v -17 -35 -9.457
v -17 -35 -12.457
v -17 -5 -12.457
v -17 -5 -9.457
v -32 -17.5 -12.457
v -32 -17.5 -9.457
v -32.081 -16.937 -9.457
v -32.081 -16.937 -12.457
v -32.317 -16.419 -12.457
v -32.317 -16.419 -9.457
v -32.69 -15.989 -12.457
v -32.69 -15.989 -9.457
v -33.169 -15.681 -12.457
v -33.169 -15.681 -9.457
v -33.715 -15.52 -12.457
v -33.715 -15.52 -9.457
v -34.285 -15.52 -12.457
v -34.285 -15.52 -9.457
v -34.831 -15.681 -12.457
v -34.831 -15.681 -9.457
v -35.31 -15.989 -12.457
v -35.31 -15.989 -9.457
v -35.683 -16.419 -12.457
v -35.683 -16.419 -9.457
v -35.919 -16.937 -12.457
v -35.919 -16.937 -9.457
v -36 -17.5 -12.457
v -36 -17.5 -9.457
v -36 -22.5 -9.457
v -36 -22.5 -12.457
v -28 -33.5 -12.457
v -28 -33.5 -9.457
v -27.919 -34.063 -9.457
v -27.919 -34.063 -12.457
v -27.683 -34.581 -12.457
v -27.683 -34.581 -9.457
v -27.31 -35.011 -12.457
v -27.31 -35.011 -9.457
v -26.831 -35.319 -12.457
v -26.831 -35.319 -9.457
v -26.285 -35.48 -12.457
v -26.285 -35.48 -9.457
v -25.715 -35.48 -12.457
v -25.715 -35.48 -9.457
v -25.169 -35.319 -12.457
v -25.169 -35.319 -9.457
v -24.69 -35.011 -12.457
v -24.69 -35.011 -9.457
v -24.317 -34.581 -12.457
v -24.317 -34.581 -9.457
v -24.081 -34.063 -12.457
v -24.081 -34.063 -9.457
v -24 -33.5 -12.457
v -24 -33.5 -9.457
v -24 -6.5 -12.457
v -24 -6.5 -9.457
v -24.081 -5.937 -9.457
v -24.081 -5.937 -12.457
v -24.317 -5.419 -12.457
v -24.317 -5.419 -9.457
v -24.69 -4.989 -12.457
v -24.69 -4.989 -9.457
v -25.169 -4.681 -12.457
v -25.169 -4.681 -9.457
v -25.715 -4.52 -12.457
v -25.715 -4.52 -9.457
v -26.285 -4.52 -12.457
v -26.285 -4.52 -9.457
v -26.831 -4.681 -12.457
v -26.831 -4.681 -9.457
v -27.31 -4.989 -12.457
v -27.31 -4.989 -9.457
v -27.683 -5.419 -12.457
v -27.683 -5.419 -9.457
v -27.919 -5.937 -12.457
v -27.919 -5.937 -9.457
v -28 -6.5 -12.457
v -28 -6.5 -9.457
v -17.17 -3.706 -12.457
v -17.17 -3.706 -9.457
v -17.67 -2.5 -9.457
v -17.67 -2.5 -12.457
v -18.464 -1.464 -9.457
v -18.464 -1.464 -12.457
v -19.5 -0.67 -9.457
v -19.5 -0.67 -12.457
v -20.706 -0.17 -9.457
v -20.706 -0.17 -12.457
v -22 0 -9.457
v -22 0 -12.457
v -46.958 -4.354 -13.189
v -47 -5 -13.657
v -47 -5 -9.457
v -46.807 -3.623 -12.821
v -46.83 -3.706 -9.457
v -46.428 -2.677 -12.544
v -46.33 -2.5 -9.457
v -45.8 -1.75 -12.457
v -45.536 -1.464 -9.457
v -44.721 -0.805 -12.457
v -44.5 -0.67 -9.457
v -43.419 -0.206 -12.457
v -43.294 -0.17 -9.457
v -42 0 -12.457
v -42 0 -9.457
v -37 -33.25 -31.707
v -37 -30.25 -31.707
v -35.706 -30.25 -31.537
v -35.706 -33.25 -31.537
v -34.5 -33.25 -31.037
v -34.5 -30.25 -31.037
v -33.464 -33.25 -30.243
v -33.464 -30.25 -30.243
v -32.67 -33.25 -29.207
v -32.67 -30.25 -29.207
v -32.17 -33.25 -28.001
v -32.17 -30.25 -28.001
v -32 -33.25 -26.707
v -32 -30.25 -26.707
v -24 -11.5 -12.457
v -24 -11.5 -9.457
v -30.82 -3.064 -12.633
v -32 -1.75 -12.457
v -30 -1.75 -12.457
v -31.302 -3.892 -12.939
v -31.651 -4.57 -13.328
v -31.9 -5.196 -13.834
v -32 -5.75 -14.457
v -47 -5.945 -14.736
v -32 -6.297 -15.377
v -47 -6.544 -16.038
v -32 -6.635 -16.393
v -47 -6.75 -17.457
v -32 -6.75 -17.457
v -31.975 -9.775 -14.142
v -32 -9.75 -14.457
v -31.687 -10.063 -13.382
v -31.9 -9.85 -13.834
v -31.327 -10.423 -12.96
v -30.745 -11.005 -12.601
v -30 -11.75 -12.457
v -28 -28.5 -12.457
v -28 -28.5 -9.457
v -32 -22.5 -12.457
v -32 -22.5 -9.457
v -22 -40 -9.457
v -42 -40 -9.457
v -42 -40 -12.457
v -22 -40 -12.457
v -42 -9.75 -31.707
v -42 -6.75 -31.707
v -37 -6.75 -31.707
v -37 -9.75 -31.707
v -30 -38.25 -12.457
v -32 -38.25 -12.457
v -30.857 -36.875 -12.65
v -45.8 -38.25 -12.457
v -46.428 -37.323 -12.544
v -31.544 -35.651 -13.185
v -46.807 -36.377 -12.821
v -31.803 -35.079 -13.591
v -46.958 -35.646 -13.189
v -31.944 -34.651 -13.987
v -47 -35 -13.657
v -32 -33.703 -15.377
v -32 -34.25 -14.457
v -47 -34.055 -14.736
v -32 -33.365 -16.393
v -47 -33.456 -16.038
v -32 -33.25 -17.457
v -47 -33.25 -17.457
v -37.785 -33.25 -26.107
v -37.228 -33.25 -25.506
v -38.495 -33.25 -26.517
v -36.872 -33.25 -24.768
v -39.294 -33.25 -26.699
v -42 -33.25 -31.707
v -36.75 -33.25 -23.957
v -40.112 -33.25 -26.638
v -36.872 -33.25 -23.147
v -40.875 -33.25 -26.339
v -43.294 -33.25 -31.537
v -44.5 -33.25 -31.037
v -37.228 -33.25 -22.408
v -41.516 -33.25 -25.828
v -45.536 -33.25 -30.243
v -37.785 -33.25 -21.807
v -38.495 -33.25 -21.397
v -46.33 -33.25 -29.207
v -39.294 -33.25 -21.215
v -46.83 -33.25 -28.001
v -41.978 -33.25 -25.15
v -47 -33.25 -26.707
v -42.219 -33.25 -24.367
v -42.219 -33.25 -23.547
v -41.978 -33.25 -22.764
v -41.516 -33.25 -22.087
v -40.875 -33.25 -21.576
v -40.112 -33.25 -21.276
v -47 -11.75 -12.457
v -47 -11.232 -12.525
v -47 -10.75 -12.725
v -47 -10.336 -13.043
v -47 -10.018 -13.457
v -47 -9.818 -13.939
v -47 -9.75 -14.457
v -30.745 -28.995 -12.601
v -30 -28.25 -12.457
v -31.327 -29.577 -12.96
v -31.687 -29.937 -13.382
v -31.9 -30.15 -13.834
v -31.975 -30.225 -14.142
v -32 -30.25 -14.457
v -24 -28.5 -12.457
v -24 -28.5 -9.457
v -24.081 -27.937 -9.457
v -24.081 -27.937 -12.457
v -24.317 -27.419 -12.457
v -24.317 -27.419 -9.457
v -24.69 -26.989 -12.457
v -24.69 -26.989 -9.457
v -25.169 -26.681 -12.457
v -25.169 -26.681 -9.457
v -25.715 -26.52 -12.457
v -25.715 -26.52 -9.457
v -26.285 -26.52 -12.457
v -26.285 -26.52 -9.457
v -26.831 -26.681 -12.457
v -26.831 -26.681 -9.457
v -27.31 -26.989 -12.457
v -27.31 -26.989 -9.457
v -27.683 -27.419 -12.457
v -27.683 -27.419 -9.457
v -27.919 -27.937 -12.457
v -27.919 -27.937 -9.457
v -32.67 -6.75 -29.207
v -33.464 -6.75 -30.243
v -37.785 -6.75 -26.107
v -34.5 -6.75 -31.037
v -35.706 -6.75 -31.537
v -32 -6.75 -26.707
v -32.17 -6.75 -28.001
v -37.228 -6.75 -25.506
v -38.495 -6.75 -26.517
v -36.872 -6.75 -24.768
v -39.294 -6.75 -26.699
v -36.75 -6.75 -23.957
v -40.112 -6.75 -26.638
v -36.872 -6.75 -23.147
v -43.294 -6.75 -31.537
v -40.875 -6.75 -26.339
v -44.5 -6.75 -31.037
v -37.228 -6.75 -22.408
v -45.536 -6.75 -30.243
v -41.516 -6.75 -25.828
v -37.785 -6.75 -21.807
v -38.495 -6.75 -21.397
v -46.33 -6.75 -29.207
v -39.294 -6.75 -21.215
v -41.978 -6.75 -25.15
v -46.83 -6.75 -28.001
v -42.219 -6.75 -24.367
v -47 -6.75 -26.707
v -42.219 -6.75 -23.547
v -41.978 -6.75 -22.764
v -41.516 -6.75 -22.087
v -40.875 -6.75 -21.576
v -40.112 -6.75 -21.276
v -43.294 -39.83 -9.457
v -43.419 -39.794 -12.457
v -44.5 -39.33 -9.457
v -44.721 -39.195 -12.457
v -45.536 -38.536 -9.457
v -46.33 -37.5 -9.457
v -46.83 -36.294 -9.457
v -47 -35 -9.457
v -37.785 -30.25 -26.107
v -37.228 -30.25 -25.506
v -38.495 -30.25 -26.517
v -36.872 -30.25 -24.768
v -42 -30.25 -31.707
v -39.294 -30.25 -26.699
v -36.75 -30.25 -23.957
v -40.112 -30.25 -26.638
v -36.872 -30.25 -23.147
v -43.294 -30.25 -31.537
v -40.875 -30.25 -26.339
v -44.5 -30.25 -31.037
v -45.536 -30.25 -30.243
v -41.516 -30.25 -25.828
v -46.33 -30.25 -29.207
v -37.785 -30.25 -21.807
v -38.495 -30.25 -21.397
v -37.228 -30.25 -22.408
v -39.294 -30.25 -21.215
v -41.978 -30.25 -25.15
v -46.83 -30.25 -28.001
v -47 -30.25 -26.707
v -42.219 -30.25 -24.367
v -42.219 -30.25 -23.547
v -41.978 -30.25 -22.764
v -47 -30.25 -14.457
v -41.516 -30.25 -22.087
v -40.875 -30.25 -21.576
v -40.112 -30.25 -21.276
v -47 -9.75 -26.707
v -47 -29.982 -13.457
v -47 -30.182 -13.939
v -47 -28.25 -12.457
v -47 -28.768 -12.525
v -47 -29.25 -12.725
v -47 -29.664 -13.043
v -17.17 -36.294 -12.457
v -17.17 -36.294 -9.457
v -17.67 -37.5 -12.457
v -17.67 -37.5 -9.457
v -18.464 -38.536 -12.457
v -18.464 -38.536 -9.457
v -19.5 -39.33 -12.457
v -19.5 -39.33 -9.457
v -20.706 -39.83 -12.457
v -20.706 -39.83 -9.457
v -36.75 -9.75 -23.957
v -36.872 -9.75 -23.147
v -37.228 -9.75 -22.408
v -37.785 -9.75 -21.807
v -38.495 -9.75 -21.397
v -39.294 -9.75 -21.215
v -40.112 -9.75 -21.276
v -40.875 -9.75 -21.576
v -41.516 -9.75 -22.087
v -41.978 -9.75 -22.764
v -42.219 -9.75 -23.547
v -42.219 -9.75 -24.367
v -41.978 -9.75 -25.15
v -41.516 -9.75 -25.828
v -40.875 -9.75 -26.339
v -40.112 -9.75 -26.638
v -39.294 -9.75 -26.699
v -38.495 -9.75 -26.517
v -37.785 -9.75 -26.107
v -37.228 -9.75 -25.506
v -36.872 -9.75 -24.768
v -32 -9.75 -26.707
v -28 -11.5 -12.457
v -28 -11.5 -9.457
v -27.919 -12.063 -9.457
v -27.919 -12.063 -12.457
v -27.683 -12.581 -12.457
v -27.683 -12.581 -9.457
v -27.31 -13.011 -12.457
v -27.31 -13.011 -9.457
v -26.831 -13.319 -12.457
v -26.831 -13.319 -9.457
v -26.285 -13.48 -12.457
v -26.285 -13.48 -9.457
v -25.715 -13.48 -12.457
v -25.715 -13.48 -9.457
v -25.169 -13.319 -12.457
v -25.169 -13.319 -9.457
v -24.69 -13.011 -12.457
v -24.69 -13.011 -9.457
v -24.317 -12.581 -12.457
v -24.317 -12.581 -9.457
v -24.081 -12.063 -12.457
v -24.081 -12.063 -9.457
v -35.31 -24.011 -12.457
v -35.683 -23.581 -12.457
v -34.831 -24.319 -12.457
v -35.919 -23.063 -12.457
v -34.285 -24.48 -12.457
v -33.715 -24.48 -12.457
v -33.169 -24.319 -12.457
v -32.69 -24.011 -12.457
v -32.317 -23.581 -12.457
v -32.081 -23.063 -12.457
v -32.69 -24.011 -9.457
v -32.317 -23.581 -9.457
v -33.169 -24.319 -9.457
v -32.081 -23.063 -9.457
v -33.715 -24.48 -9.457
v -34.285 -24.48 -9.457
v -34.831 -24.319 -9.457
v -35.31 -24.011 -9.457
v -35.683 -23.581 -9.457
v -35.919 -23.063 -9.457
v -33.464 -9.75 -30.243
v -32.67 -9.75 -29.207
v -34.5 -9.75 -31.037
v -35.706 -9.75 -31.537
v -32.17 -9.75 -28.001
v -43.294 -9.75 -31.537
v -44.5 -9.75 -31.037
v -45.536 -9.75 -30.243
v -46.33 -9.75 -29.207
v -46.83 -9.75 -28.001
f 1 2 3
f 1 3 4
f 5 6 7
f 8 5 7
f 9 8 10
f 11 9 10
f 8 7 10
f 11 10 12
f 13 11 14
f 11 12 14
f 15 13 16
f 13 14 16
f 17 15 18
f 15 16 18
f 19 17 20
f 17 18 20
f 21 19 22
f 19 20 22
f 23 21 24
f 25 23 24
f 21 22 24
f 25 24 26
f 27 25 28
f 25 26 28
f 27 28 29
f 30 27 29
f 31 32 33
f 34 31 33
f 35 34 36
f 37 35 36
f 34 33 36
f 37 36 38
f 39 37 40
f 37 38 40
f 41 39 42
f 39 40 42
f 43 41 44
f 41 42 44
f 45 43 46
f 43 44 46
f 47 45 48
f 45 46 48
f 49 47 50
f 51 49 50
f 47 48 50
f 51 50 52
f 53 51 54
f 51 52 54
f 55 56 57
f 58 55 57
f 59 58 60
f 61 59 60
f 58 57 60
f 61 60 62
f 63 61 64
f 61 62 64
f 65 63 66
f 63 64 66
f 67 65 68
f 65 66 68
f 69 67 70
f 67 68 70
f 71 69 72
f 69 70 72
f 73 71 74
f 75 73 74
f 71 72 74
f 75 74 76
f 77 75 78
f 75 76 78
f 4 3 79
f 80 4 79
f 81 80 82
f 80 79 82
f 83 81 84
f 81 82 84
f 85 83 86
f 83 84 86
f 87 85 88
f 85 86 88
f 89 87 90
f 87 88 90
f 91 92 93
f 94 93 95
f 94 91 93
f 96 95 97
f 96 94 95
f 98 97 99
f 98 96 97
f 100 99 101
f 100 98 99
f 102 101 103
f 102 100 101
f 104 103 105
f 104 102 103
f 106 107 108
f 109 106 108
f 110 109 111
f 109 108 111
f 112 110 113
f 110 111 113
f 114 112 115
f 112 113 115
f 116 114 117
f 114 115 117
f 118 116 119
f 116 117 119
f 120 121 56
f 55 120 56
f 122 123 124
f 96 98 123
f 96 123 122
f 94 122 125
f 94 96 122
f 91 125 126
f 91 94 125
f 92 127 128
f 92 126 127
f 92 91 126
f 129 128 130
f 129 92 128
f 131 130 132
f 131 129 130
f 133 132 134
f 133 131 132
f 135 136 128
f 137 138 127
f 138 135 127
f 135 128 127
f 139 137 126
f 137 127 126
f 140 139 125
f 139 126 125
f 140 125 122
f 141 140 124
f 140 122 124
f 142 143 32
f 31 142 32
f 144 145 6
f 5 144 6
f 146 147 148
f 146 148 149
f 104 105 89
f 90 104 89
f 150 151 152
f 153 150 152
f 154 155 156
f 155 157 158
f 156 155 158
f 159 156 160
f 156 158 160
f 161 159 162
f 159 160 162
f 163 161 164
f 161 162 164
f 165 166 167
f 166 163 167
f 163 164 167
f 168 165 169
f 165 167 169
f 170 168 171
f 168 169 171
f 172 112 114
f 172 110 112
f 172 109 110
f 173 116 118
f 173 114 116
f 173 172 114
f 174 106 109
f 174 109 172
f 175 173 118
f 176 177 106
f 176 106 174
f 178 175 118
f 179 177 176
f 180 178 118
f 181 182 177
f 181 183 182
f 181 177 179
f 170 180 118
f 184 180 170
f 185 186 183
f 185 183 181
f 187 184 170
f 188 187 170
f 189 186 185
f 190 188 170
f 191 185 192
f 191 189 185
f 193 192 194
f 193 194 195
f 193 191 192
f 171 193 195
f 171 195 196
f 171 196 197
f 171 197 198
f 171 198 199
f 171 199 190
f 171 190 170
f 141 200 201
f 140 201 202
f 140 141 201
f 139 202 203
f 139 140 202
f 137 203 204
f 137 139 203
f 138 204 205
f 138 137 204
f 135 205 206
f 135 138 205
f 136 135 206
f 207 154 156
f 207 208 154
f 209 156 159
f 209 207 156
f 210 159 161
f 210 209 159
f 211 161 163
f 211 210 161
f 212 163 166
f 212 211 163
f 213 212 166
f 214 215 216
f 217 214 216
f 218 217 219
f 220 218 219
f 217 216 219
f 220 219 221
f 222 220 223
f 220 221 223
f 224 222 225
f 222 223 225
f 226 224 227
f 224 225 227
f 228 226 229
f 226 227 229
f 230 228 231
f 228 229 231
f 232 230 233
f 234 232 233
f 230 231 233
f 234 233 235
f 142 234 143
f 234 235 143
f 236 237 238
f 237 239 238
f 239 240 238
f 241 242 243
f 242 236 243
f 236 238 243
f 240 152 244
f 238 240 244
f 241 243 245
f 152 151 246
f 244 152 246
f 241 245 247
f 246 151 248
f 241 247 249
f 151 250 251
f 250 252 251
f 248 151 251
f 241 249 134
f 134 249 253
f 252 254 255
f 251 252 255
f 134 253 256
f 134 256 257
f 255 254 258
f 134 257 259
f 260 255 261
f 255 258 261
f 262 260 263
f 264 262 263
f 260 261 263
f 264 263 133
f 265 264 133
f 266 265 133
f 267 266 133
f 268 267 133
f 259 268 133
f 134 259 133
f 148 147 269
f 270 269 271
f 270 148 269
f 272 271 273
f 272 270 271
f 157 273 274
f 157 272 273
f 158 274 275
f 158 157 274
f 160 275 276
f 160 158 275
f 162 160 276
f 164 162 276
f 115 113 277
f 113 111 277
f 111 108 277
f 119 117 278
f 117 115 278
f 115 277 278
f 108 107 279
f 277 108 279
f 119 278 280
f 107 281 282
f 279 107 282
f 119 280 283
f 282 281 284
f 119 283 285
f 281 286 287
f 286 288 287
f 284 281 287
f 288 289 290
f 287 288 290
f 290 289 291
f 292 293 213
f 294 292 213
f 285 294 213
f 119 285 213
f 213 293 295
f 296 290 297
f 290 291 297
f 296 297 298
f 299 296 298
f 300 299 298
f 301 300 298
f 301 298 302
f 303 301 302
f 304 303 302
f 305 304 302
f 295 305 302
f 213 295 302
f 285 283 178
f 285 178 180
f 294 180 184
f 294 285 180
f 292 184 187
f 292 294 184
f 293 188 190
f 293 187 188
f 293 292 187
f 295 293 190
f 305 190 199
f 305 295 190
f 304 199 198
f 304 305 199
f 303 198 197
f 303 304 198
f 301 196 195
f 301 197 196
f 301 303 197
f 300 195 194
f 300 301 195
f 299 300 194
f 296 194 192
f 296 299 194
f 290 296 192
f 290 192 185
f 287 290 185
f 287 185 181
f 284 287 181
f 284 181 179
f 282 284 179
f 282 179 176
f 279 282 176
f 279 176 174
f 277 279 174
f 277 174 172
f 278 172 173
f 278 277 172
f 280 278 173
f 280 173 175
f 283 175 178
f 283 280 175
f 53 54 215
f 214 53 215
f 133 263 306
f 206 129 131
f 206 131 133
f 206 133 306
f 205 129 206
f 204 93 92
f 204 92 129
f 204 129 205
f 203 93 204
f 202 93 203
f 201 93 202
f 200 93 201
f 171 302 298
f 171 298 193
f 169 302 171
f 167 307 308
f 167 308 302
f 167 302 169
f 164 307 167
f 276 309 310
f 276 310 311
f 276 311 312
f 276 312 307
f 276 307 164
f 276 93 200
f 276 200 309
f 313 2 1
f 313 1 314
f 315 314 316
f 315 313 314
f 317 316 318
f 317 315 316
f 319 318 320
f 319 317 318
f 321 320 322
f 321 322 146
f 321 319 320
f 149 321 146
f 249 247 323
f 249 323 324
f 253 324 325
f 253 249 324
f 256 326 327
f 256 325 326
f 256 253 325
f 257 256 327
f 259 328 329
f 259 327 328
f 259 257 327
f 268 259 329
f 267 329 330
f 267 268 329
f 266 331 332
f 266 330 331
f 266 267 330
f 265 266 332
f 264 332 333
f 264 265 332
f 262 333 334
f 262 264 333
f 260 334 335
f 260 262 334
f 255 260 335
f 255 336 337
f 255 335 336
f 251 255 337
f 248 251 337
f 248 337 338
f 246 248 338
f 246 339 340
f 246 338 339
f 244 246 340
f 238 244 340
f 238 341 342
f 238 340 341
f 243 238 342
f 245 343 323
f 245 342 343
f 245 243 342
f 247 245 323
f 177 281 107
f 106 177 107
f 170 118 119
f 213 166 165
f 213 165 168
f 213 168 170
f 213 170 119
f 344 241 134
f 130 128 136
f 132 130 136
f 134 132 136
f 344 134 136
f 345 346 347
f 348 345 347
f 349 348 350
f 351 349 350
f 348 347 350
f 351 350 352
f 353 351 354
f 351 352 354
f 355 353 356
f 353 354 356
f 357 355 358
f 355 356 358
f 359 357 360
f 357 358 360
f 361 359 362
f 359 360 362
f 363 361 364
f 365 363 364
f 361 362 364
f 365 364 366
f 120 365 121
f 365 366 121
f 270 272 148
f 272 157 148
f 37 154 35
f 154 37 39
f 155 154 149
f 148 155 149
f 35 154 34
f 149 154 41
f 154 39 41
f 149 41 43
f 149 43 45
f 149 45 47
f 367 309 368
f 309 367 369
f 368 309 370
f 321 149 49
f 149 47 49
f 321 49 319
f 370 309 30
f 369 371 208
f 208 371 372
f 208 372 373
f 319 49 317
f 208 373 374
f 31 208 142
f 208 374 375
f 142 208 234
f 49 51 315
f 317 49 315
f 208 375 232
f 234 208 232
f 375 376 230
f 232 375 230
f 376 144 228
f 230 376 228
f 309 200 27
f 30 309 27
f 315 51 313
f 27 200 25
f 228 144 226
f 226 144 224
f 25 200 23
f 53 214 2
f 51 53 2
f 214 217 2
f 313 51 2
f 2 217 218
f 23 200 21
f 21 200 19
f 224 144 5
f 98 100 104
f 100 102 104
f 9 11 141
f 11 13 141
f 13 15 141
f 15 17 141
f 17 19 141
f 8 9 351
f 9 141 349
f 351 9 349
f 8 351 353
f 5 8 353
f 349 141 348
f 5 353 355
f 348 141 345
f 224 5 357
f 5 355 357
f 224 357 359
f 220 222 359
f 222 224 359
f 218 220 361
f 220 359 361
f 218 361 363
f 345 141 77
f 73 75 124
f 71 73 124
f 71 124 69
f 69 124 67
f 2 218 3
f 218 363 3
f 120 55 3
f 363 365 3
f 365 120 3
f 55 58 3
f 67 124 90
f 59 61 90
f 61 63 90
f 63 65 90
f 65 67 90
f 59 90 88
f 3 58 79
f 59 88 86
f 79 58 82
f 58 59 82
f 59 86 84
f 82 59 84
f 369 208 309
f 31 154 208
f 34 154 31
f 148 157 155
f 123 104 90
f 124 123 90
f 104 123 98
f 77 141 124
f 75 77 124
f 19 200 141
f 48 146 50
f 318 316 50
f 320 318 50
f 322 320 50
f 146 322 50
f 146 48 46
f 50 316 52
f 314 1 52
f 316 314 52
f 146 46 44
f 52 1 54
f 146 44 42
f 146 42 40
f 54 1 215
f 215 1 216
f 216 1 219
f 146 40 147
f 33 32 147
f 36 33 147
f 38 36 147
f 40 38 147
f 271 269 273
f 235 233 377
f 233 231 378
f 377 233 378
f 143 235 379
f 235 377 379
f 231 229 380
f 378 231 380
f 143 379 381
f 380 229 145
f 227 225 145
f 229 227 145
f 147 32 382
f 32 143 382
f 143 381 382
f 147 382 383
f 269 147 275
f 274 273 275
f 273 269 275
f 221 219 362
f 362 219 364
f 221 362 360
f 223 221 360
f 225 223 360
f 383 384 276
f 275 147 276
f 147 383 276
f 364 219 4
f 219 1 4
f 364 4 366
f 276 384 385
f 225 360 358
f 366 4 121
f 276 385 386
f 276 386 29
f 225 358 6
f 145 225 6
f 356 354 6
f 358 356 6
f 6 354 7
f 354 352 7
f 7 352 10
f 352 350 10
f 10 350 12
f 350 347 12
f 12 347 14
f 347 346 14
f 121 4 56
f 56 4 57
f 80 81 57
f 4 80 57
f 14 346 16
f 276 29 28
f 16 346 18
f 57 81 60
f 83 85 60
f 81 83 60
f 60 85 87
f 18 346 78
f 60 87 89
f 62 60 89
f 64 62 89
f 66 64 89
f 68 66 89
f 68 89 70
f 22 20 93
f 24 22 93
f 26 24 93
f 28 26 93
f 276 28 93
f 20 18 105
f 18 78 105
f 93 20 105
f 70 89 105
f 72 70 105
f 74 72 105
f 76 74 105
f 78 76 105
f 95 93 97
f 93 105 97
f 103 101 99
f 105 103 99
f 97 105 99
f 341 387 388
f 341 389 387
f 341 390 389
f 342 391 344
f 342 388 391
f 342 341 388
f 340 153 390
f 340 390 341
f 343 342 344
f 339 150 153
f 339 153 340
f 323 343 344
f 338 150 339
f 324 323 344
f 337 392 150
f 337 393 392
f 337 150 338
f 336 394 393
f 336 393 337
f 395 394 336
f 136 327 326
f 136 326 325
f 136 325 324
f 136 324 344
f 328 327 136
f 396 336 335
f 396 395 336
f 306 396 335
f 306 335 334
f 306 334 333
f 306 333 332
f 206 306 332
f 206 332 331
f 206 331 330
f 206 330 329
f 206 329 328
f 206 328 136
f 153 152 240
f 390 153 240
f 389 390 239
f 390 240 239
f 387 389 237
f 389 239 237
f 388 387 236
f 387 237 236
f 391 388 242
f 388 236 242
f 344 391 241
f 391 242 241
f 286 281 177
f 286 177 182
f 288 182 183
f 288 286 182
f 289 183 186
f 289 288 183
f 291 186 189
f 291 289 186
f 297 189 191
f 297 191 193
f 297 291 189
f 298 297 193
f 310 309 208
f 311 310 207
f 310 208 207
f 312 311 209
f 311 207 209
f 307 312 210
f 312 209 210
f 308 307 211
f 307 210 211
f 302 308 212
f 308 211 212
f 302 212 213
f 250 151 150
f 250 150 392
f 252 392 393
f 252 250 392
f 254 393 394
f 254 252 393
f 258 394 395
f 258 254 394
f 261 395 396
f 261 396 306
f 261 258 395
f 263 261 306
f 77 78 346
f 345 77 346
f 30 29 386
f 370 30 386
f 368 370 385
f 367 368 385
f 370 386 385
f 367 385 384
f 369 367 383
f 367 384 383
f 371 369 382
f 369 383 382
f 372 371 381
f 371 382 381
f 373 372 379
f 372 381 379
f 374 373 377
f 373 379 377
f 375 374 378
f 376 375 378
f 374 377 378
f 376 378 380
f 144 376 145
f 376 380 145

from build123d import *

# Parameters (mm, degrees)
F2_W        = 15
F2_H        = 19.25
F2_R        = 2.75
F3_DEPTH    = 40
F5_DEPTH    = 22.251
F6_W        = 6.75
F6_H        = 19.25
F6_W_2      = 20.5
F7_DEPTH    = 30.001
F8_T1_DEPTH = 15
F8_T3_DEPTH = 28
F8_T5_DEPTH = 28
F8_T7_DEPTH = 28
F10_R       = 2


# Not quite as in the source:
# - a fillet or chamfer that OpenCascade refuses, or shapes differently, is made with other operations: its cross-section is extruded or revolved along the edge and cut away or added
# - a feature of the source that left no trace in its solid (it failed there, or was rolled back) is left out


with BuildPart() as f3:
    # F2 (on Front) → F3 (new body)
    with BuildSketch(Plane.XZ):
        Polygon((-47, -12.4571), (-32, -12.4571), (-17, -12.4571), (-17, -9.4571), (-47, -9.4571), align=None)
        with Locations((-39.5, -22.0821)):
            Rectangle(F2_W, F2_H)
        with Locations((-39.5, -23.9571)):
            Circle(F2_R, mode=Mode.SUBTRACT)
    extrude(amount=F3_DEPTH)

    # F4 (on face) → F5 (cut, through all)
    with BuildSketch(Plane.XY.offset(-9.4571)):
        with BuildLine():
            Line((-24, -11.5), (-24, -6.5))
            ThreePointArc((-24, -6.5), (-26, -4.5), (-28, -6.5))
            Line((-28, -6.5), (-28, -11.5))
            ThreePointArc((-28, -11.5), (-26, -13.5), (-24, -11.5))
        make_face()
        with BuildLine():
            Line((-32, -22.5), (-32, -17.5))
            ThreePointArc((-32, -17.5), (-34, -15.5), (-36, -17.5))
            Line((-36, -17.5), (-36, -22.5))
            ThreePointArc((-36, -22.5), (-34, -24.5), (-32, -22.5))
        make_face()
        with BuildLine():
            ThreePointArc((-28, -33.5), (-26, -35.5), (-24, -33.5))
            Line((-24, -33.5), (-24, -28.5))
            ThreePointArc((-24, -28.5), (-26, -26.5), (-28, -28.5))
            Line((-28, -28.5), (-28, -33.5))
        make_face()
    extrude(amount=-F5_DEPTH, mode=Mode.SUBTRACT)

    # F6 (on face) → F7 (cut, through all)
    with BuildSketch(Plane(origin=(-47, 0, 0), x_dir=(0, -1, 0), z_dir=(-1, 0, 0))):
        with Locations((3.375, -22.0821)):
            Rectangle(F6_W, F6_H)
        with Locations((20, -22.0821)):
            Rectangle(F6_W_2, F6_H)
        with Locations((36.625, -22.0821)):
            Rectangle(F6_W, F6_H)
    extrude(amount=-F7_DEPTH, mode=Mode.SUBTRACT)

    # F8: fillet of radius 5 on 10 edges, made by hand

    # F8_s2 → F8_t1 (join)
    with BuildSketch(Plane.YZ.offset(-47)):
        with BuildLine():
            ThreePointArc((-1.75, -12.4571), (-5.2855339059, -13.9215660941), (-6.75, -17.4571))
            Line((-6.75, -17.4571), (-6.75, -12.4571))
            Line((-6.75, -12.4571), (-1.75, -12.4571))
        make_face()
        with BuildLine():
            ThreePointArc((-38.25, -12.4571), (-34.7144660941, -13.9215660941), (-33.25, -17.4571))
            Line((-33.25, -17.4571), (-33.25, -12.4571))
            Line((-33.25, -12.4571), (-38.25, -12.4571))
        make_face()
    extrude(amount=F8_T1_DEPTH)

    # F8_s4 → F8_t3 (cut)
    with BuildSketch(Plane.XY.offset(-24.9571)):
        with BuildLine():
            ThreePointArc((-17, -5), (-18.4644660941, -1.4644660941), (-22, 0))
            Line((-22, 0), (-17, 0))
            Line((-17, 0), (-17, -5))
        make_face()
        with BuildLine():
            ThreePointArc((-17, -35), (-18.4644660941, -38.5355339059), (-22, -40))
            Line((-22, -40), (-17, -40))
            Line((-17, -40), (-17, -35))
        make_face()
        with BuildLine():
            ThreePointArc((-47, -5), (-45.5355339059, -1.4644660941), (-42, 0))
            Line((-42, 0), (-47, 0))
            Line((-47, 0), (-47, -5))
        make_face()
        with BuildLine():
            ThreePointArc((-42, -40), (-45.5355339059, -38.5355339059), (-47, -35))
            Line((-47, -35), (-47, -40))
            Line((-47, -40), (-42, -40))
        make_face()
    extrude(amount=F8_T3_DEPTH, mode=Mode.SUBTRACT)

    # F8_s6 → F8_t5 (cut)
    with BuildSketch(Plane.XZ.offset(17.75)):
        with BuildLine():
            ThreePointArc((-42, -31.7071), (-45.5355339059, -30.2426339059), (-47, -26.7071))
            Line((-47, -26.7071), (-47, -31.7071))
            Line((-47, -31.7071), (-42, -31.7071))
        make_face()
        with BuildLine():
            ThreePointArc((-37, -31.7071), (-33.4644660941, -30.2426339059), (-32, -26.7071))
            Line((-32, -26.7071), (-32, -31.7071))
            Line((-32, -31.7071), (-37, -31.7071))
        make_face()
    extrude(amount=F8_T5_DEPTH, mode=Mode.SUBTRACT)

    # F8_s8 → F8_t7 (cut)
    with BuildSketch(Plane.XZ.offset(-5.75)):
        with BuildLine():
            ThreePointArc((-42, -31.7071), (-45.5355339059, -30.2426339059), (-47, -26.7071))
            Line((-47, -26.7071), (-47, -31.7071))
            Line((-47, -31.7071), (-42, -31.7071))
        make_face()
        with BuildLine():
            ThreePointArc((-37, -31.7071), (-33.4644660941, -30.2426339059), (-32, -26.7071))
            Line((-32, -26.7071), (-32, -31.7071))
            Line((-32, -31.7071), (-37, -31.7071))
        make_face()
    extrude(amount=F8_T7_DEPTH, mode=Mode.SUBTRACT)

    # F10
    f10_edges = [f3.edges().sort_by_distance(p)[0] for p in [
        (-39.5, -30.25, -12.4571),
        (-39.5, -9.75, -12.4571),
        (-32, -34.25, -12.4571),
        (-32, -5.75, -12.4571),
    ]]
    fillet(f10_edges, radius=F10_R)


solid = f3.part
